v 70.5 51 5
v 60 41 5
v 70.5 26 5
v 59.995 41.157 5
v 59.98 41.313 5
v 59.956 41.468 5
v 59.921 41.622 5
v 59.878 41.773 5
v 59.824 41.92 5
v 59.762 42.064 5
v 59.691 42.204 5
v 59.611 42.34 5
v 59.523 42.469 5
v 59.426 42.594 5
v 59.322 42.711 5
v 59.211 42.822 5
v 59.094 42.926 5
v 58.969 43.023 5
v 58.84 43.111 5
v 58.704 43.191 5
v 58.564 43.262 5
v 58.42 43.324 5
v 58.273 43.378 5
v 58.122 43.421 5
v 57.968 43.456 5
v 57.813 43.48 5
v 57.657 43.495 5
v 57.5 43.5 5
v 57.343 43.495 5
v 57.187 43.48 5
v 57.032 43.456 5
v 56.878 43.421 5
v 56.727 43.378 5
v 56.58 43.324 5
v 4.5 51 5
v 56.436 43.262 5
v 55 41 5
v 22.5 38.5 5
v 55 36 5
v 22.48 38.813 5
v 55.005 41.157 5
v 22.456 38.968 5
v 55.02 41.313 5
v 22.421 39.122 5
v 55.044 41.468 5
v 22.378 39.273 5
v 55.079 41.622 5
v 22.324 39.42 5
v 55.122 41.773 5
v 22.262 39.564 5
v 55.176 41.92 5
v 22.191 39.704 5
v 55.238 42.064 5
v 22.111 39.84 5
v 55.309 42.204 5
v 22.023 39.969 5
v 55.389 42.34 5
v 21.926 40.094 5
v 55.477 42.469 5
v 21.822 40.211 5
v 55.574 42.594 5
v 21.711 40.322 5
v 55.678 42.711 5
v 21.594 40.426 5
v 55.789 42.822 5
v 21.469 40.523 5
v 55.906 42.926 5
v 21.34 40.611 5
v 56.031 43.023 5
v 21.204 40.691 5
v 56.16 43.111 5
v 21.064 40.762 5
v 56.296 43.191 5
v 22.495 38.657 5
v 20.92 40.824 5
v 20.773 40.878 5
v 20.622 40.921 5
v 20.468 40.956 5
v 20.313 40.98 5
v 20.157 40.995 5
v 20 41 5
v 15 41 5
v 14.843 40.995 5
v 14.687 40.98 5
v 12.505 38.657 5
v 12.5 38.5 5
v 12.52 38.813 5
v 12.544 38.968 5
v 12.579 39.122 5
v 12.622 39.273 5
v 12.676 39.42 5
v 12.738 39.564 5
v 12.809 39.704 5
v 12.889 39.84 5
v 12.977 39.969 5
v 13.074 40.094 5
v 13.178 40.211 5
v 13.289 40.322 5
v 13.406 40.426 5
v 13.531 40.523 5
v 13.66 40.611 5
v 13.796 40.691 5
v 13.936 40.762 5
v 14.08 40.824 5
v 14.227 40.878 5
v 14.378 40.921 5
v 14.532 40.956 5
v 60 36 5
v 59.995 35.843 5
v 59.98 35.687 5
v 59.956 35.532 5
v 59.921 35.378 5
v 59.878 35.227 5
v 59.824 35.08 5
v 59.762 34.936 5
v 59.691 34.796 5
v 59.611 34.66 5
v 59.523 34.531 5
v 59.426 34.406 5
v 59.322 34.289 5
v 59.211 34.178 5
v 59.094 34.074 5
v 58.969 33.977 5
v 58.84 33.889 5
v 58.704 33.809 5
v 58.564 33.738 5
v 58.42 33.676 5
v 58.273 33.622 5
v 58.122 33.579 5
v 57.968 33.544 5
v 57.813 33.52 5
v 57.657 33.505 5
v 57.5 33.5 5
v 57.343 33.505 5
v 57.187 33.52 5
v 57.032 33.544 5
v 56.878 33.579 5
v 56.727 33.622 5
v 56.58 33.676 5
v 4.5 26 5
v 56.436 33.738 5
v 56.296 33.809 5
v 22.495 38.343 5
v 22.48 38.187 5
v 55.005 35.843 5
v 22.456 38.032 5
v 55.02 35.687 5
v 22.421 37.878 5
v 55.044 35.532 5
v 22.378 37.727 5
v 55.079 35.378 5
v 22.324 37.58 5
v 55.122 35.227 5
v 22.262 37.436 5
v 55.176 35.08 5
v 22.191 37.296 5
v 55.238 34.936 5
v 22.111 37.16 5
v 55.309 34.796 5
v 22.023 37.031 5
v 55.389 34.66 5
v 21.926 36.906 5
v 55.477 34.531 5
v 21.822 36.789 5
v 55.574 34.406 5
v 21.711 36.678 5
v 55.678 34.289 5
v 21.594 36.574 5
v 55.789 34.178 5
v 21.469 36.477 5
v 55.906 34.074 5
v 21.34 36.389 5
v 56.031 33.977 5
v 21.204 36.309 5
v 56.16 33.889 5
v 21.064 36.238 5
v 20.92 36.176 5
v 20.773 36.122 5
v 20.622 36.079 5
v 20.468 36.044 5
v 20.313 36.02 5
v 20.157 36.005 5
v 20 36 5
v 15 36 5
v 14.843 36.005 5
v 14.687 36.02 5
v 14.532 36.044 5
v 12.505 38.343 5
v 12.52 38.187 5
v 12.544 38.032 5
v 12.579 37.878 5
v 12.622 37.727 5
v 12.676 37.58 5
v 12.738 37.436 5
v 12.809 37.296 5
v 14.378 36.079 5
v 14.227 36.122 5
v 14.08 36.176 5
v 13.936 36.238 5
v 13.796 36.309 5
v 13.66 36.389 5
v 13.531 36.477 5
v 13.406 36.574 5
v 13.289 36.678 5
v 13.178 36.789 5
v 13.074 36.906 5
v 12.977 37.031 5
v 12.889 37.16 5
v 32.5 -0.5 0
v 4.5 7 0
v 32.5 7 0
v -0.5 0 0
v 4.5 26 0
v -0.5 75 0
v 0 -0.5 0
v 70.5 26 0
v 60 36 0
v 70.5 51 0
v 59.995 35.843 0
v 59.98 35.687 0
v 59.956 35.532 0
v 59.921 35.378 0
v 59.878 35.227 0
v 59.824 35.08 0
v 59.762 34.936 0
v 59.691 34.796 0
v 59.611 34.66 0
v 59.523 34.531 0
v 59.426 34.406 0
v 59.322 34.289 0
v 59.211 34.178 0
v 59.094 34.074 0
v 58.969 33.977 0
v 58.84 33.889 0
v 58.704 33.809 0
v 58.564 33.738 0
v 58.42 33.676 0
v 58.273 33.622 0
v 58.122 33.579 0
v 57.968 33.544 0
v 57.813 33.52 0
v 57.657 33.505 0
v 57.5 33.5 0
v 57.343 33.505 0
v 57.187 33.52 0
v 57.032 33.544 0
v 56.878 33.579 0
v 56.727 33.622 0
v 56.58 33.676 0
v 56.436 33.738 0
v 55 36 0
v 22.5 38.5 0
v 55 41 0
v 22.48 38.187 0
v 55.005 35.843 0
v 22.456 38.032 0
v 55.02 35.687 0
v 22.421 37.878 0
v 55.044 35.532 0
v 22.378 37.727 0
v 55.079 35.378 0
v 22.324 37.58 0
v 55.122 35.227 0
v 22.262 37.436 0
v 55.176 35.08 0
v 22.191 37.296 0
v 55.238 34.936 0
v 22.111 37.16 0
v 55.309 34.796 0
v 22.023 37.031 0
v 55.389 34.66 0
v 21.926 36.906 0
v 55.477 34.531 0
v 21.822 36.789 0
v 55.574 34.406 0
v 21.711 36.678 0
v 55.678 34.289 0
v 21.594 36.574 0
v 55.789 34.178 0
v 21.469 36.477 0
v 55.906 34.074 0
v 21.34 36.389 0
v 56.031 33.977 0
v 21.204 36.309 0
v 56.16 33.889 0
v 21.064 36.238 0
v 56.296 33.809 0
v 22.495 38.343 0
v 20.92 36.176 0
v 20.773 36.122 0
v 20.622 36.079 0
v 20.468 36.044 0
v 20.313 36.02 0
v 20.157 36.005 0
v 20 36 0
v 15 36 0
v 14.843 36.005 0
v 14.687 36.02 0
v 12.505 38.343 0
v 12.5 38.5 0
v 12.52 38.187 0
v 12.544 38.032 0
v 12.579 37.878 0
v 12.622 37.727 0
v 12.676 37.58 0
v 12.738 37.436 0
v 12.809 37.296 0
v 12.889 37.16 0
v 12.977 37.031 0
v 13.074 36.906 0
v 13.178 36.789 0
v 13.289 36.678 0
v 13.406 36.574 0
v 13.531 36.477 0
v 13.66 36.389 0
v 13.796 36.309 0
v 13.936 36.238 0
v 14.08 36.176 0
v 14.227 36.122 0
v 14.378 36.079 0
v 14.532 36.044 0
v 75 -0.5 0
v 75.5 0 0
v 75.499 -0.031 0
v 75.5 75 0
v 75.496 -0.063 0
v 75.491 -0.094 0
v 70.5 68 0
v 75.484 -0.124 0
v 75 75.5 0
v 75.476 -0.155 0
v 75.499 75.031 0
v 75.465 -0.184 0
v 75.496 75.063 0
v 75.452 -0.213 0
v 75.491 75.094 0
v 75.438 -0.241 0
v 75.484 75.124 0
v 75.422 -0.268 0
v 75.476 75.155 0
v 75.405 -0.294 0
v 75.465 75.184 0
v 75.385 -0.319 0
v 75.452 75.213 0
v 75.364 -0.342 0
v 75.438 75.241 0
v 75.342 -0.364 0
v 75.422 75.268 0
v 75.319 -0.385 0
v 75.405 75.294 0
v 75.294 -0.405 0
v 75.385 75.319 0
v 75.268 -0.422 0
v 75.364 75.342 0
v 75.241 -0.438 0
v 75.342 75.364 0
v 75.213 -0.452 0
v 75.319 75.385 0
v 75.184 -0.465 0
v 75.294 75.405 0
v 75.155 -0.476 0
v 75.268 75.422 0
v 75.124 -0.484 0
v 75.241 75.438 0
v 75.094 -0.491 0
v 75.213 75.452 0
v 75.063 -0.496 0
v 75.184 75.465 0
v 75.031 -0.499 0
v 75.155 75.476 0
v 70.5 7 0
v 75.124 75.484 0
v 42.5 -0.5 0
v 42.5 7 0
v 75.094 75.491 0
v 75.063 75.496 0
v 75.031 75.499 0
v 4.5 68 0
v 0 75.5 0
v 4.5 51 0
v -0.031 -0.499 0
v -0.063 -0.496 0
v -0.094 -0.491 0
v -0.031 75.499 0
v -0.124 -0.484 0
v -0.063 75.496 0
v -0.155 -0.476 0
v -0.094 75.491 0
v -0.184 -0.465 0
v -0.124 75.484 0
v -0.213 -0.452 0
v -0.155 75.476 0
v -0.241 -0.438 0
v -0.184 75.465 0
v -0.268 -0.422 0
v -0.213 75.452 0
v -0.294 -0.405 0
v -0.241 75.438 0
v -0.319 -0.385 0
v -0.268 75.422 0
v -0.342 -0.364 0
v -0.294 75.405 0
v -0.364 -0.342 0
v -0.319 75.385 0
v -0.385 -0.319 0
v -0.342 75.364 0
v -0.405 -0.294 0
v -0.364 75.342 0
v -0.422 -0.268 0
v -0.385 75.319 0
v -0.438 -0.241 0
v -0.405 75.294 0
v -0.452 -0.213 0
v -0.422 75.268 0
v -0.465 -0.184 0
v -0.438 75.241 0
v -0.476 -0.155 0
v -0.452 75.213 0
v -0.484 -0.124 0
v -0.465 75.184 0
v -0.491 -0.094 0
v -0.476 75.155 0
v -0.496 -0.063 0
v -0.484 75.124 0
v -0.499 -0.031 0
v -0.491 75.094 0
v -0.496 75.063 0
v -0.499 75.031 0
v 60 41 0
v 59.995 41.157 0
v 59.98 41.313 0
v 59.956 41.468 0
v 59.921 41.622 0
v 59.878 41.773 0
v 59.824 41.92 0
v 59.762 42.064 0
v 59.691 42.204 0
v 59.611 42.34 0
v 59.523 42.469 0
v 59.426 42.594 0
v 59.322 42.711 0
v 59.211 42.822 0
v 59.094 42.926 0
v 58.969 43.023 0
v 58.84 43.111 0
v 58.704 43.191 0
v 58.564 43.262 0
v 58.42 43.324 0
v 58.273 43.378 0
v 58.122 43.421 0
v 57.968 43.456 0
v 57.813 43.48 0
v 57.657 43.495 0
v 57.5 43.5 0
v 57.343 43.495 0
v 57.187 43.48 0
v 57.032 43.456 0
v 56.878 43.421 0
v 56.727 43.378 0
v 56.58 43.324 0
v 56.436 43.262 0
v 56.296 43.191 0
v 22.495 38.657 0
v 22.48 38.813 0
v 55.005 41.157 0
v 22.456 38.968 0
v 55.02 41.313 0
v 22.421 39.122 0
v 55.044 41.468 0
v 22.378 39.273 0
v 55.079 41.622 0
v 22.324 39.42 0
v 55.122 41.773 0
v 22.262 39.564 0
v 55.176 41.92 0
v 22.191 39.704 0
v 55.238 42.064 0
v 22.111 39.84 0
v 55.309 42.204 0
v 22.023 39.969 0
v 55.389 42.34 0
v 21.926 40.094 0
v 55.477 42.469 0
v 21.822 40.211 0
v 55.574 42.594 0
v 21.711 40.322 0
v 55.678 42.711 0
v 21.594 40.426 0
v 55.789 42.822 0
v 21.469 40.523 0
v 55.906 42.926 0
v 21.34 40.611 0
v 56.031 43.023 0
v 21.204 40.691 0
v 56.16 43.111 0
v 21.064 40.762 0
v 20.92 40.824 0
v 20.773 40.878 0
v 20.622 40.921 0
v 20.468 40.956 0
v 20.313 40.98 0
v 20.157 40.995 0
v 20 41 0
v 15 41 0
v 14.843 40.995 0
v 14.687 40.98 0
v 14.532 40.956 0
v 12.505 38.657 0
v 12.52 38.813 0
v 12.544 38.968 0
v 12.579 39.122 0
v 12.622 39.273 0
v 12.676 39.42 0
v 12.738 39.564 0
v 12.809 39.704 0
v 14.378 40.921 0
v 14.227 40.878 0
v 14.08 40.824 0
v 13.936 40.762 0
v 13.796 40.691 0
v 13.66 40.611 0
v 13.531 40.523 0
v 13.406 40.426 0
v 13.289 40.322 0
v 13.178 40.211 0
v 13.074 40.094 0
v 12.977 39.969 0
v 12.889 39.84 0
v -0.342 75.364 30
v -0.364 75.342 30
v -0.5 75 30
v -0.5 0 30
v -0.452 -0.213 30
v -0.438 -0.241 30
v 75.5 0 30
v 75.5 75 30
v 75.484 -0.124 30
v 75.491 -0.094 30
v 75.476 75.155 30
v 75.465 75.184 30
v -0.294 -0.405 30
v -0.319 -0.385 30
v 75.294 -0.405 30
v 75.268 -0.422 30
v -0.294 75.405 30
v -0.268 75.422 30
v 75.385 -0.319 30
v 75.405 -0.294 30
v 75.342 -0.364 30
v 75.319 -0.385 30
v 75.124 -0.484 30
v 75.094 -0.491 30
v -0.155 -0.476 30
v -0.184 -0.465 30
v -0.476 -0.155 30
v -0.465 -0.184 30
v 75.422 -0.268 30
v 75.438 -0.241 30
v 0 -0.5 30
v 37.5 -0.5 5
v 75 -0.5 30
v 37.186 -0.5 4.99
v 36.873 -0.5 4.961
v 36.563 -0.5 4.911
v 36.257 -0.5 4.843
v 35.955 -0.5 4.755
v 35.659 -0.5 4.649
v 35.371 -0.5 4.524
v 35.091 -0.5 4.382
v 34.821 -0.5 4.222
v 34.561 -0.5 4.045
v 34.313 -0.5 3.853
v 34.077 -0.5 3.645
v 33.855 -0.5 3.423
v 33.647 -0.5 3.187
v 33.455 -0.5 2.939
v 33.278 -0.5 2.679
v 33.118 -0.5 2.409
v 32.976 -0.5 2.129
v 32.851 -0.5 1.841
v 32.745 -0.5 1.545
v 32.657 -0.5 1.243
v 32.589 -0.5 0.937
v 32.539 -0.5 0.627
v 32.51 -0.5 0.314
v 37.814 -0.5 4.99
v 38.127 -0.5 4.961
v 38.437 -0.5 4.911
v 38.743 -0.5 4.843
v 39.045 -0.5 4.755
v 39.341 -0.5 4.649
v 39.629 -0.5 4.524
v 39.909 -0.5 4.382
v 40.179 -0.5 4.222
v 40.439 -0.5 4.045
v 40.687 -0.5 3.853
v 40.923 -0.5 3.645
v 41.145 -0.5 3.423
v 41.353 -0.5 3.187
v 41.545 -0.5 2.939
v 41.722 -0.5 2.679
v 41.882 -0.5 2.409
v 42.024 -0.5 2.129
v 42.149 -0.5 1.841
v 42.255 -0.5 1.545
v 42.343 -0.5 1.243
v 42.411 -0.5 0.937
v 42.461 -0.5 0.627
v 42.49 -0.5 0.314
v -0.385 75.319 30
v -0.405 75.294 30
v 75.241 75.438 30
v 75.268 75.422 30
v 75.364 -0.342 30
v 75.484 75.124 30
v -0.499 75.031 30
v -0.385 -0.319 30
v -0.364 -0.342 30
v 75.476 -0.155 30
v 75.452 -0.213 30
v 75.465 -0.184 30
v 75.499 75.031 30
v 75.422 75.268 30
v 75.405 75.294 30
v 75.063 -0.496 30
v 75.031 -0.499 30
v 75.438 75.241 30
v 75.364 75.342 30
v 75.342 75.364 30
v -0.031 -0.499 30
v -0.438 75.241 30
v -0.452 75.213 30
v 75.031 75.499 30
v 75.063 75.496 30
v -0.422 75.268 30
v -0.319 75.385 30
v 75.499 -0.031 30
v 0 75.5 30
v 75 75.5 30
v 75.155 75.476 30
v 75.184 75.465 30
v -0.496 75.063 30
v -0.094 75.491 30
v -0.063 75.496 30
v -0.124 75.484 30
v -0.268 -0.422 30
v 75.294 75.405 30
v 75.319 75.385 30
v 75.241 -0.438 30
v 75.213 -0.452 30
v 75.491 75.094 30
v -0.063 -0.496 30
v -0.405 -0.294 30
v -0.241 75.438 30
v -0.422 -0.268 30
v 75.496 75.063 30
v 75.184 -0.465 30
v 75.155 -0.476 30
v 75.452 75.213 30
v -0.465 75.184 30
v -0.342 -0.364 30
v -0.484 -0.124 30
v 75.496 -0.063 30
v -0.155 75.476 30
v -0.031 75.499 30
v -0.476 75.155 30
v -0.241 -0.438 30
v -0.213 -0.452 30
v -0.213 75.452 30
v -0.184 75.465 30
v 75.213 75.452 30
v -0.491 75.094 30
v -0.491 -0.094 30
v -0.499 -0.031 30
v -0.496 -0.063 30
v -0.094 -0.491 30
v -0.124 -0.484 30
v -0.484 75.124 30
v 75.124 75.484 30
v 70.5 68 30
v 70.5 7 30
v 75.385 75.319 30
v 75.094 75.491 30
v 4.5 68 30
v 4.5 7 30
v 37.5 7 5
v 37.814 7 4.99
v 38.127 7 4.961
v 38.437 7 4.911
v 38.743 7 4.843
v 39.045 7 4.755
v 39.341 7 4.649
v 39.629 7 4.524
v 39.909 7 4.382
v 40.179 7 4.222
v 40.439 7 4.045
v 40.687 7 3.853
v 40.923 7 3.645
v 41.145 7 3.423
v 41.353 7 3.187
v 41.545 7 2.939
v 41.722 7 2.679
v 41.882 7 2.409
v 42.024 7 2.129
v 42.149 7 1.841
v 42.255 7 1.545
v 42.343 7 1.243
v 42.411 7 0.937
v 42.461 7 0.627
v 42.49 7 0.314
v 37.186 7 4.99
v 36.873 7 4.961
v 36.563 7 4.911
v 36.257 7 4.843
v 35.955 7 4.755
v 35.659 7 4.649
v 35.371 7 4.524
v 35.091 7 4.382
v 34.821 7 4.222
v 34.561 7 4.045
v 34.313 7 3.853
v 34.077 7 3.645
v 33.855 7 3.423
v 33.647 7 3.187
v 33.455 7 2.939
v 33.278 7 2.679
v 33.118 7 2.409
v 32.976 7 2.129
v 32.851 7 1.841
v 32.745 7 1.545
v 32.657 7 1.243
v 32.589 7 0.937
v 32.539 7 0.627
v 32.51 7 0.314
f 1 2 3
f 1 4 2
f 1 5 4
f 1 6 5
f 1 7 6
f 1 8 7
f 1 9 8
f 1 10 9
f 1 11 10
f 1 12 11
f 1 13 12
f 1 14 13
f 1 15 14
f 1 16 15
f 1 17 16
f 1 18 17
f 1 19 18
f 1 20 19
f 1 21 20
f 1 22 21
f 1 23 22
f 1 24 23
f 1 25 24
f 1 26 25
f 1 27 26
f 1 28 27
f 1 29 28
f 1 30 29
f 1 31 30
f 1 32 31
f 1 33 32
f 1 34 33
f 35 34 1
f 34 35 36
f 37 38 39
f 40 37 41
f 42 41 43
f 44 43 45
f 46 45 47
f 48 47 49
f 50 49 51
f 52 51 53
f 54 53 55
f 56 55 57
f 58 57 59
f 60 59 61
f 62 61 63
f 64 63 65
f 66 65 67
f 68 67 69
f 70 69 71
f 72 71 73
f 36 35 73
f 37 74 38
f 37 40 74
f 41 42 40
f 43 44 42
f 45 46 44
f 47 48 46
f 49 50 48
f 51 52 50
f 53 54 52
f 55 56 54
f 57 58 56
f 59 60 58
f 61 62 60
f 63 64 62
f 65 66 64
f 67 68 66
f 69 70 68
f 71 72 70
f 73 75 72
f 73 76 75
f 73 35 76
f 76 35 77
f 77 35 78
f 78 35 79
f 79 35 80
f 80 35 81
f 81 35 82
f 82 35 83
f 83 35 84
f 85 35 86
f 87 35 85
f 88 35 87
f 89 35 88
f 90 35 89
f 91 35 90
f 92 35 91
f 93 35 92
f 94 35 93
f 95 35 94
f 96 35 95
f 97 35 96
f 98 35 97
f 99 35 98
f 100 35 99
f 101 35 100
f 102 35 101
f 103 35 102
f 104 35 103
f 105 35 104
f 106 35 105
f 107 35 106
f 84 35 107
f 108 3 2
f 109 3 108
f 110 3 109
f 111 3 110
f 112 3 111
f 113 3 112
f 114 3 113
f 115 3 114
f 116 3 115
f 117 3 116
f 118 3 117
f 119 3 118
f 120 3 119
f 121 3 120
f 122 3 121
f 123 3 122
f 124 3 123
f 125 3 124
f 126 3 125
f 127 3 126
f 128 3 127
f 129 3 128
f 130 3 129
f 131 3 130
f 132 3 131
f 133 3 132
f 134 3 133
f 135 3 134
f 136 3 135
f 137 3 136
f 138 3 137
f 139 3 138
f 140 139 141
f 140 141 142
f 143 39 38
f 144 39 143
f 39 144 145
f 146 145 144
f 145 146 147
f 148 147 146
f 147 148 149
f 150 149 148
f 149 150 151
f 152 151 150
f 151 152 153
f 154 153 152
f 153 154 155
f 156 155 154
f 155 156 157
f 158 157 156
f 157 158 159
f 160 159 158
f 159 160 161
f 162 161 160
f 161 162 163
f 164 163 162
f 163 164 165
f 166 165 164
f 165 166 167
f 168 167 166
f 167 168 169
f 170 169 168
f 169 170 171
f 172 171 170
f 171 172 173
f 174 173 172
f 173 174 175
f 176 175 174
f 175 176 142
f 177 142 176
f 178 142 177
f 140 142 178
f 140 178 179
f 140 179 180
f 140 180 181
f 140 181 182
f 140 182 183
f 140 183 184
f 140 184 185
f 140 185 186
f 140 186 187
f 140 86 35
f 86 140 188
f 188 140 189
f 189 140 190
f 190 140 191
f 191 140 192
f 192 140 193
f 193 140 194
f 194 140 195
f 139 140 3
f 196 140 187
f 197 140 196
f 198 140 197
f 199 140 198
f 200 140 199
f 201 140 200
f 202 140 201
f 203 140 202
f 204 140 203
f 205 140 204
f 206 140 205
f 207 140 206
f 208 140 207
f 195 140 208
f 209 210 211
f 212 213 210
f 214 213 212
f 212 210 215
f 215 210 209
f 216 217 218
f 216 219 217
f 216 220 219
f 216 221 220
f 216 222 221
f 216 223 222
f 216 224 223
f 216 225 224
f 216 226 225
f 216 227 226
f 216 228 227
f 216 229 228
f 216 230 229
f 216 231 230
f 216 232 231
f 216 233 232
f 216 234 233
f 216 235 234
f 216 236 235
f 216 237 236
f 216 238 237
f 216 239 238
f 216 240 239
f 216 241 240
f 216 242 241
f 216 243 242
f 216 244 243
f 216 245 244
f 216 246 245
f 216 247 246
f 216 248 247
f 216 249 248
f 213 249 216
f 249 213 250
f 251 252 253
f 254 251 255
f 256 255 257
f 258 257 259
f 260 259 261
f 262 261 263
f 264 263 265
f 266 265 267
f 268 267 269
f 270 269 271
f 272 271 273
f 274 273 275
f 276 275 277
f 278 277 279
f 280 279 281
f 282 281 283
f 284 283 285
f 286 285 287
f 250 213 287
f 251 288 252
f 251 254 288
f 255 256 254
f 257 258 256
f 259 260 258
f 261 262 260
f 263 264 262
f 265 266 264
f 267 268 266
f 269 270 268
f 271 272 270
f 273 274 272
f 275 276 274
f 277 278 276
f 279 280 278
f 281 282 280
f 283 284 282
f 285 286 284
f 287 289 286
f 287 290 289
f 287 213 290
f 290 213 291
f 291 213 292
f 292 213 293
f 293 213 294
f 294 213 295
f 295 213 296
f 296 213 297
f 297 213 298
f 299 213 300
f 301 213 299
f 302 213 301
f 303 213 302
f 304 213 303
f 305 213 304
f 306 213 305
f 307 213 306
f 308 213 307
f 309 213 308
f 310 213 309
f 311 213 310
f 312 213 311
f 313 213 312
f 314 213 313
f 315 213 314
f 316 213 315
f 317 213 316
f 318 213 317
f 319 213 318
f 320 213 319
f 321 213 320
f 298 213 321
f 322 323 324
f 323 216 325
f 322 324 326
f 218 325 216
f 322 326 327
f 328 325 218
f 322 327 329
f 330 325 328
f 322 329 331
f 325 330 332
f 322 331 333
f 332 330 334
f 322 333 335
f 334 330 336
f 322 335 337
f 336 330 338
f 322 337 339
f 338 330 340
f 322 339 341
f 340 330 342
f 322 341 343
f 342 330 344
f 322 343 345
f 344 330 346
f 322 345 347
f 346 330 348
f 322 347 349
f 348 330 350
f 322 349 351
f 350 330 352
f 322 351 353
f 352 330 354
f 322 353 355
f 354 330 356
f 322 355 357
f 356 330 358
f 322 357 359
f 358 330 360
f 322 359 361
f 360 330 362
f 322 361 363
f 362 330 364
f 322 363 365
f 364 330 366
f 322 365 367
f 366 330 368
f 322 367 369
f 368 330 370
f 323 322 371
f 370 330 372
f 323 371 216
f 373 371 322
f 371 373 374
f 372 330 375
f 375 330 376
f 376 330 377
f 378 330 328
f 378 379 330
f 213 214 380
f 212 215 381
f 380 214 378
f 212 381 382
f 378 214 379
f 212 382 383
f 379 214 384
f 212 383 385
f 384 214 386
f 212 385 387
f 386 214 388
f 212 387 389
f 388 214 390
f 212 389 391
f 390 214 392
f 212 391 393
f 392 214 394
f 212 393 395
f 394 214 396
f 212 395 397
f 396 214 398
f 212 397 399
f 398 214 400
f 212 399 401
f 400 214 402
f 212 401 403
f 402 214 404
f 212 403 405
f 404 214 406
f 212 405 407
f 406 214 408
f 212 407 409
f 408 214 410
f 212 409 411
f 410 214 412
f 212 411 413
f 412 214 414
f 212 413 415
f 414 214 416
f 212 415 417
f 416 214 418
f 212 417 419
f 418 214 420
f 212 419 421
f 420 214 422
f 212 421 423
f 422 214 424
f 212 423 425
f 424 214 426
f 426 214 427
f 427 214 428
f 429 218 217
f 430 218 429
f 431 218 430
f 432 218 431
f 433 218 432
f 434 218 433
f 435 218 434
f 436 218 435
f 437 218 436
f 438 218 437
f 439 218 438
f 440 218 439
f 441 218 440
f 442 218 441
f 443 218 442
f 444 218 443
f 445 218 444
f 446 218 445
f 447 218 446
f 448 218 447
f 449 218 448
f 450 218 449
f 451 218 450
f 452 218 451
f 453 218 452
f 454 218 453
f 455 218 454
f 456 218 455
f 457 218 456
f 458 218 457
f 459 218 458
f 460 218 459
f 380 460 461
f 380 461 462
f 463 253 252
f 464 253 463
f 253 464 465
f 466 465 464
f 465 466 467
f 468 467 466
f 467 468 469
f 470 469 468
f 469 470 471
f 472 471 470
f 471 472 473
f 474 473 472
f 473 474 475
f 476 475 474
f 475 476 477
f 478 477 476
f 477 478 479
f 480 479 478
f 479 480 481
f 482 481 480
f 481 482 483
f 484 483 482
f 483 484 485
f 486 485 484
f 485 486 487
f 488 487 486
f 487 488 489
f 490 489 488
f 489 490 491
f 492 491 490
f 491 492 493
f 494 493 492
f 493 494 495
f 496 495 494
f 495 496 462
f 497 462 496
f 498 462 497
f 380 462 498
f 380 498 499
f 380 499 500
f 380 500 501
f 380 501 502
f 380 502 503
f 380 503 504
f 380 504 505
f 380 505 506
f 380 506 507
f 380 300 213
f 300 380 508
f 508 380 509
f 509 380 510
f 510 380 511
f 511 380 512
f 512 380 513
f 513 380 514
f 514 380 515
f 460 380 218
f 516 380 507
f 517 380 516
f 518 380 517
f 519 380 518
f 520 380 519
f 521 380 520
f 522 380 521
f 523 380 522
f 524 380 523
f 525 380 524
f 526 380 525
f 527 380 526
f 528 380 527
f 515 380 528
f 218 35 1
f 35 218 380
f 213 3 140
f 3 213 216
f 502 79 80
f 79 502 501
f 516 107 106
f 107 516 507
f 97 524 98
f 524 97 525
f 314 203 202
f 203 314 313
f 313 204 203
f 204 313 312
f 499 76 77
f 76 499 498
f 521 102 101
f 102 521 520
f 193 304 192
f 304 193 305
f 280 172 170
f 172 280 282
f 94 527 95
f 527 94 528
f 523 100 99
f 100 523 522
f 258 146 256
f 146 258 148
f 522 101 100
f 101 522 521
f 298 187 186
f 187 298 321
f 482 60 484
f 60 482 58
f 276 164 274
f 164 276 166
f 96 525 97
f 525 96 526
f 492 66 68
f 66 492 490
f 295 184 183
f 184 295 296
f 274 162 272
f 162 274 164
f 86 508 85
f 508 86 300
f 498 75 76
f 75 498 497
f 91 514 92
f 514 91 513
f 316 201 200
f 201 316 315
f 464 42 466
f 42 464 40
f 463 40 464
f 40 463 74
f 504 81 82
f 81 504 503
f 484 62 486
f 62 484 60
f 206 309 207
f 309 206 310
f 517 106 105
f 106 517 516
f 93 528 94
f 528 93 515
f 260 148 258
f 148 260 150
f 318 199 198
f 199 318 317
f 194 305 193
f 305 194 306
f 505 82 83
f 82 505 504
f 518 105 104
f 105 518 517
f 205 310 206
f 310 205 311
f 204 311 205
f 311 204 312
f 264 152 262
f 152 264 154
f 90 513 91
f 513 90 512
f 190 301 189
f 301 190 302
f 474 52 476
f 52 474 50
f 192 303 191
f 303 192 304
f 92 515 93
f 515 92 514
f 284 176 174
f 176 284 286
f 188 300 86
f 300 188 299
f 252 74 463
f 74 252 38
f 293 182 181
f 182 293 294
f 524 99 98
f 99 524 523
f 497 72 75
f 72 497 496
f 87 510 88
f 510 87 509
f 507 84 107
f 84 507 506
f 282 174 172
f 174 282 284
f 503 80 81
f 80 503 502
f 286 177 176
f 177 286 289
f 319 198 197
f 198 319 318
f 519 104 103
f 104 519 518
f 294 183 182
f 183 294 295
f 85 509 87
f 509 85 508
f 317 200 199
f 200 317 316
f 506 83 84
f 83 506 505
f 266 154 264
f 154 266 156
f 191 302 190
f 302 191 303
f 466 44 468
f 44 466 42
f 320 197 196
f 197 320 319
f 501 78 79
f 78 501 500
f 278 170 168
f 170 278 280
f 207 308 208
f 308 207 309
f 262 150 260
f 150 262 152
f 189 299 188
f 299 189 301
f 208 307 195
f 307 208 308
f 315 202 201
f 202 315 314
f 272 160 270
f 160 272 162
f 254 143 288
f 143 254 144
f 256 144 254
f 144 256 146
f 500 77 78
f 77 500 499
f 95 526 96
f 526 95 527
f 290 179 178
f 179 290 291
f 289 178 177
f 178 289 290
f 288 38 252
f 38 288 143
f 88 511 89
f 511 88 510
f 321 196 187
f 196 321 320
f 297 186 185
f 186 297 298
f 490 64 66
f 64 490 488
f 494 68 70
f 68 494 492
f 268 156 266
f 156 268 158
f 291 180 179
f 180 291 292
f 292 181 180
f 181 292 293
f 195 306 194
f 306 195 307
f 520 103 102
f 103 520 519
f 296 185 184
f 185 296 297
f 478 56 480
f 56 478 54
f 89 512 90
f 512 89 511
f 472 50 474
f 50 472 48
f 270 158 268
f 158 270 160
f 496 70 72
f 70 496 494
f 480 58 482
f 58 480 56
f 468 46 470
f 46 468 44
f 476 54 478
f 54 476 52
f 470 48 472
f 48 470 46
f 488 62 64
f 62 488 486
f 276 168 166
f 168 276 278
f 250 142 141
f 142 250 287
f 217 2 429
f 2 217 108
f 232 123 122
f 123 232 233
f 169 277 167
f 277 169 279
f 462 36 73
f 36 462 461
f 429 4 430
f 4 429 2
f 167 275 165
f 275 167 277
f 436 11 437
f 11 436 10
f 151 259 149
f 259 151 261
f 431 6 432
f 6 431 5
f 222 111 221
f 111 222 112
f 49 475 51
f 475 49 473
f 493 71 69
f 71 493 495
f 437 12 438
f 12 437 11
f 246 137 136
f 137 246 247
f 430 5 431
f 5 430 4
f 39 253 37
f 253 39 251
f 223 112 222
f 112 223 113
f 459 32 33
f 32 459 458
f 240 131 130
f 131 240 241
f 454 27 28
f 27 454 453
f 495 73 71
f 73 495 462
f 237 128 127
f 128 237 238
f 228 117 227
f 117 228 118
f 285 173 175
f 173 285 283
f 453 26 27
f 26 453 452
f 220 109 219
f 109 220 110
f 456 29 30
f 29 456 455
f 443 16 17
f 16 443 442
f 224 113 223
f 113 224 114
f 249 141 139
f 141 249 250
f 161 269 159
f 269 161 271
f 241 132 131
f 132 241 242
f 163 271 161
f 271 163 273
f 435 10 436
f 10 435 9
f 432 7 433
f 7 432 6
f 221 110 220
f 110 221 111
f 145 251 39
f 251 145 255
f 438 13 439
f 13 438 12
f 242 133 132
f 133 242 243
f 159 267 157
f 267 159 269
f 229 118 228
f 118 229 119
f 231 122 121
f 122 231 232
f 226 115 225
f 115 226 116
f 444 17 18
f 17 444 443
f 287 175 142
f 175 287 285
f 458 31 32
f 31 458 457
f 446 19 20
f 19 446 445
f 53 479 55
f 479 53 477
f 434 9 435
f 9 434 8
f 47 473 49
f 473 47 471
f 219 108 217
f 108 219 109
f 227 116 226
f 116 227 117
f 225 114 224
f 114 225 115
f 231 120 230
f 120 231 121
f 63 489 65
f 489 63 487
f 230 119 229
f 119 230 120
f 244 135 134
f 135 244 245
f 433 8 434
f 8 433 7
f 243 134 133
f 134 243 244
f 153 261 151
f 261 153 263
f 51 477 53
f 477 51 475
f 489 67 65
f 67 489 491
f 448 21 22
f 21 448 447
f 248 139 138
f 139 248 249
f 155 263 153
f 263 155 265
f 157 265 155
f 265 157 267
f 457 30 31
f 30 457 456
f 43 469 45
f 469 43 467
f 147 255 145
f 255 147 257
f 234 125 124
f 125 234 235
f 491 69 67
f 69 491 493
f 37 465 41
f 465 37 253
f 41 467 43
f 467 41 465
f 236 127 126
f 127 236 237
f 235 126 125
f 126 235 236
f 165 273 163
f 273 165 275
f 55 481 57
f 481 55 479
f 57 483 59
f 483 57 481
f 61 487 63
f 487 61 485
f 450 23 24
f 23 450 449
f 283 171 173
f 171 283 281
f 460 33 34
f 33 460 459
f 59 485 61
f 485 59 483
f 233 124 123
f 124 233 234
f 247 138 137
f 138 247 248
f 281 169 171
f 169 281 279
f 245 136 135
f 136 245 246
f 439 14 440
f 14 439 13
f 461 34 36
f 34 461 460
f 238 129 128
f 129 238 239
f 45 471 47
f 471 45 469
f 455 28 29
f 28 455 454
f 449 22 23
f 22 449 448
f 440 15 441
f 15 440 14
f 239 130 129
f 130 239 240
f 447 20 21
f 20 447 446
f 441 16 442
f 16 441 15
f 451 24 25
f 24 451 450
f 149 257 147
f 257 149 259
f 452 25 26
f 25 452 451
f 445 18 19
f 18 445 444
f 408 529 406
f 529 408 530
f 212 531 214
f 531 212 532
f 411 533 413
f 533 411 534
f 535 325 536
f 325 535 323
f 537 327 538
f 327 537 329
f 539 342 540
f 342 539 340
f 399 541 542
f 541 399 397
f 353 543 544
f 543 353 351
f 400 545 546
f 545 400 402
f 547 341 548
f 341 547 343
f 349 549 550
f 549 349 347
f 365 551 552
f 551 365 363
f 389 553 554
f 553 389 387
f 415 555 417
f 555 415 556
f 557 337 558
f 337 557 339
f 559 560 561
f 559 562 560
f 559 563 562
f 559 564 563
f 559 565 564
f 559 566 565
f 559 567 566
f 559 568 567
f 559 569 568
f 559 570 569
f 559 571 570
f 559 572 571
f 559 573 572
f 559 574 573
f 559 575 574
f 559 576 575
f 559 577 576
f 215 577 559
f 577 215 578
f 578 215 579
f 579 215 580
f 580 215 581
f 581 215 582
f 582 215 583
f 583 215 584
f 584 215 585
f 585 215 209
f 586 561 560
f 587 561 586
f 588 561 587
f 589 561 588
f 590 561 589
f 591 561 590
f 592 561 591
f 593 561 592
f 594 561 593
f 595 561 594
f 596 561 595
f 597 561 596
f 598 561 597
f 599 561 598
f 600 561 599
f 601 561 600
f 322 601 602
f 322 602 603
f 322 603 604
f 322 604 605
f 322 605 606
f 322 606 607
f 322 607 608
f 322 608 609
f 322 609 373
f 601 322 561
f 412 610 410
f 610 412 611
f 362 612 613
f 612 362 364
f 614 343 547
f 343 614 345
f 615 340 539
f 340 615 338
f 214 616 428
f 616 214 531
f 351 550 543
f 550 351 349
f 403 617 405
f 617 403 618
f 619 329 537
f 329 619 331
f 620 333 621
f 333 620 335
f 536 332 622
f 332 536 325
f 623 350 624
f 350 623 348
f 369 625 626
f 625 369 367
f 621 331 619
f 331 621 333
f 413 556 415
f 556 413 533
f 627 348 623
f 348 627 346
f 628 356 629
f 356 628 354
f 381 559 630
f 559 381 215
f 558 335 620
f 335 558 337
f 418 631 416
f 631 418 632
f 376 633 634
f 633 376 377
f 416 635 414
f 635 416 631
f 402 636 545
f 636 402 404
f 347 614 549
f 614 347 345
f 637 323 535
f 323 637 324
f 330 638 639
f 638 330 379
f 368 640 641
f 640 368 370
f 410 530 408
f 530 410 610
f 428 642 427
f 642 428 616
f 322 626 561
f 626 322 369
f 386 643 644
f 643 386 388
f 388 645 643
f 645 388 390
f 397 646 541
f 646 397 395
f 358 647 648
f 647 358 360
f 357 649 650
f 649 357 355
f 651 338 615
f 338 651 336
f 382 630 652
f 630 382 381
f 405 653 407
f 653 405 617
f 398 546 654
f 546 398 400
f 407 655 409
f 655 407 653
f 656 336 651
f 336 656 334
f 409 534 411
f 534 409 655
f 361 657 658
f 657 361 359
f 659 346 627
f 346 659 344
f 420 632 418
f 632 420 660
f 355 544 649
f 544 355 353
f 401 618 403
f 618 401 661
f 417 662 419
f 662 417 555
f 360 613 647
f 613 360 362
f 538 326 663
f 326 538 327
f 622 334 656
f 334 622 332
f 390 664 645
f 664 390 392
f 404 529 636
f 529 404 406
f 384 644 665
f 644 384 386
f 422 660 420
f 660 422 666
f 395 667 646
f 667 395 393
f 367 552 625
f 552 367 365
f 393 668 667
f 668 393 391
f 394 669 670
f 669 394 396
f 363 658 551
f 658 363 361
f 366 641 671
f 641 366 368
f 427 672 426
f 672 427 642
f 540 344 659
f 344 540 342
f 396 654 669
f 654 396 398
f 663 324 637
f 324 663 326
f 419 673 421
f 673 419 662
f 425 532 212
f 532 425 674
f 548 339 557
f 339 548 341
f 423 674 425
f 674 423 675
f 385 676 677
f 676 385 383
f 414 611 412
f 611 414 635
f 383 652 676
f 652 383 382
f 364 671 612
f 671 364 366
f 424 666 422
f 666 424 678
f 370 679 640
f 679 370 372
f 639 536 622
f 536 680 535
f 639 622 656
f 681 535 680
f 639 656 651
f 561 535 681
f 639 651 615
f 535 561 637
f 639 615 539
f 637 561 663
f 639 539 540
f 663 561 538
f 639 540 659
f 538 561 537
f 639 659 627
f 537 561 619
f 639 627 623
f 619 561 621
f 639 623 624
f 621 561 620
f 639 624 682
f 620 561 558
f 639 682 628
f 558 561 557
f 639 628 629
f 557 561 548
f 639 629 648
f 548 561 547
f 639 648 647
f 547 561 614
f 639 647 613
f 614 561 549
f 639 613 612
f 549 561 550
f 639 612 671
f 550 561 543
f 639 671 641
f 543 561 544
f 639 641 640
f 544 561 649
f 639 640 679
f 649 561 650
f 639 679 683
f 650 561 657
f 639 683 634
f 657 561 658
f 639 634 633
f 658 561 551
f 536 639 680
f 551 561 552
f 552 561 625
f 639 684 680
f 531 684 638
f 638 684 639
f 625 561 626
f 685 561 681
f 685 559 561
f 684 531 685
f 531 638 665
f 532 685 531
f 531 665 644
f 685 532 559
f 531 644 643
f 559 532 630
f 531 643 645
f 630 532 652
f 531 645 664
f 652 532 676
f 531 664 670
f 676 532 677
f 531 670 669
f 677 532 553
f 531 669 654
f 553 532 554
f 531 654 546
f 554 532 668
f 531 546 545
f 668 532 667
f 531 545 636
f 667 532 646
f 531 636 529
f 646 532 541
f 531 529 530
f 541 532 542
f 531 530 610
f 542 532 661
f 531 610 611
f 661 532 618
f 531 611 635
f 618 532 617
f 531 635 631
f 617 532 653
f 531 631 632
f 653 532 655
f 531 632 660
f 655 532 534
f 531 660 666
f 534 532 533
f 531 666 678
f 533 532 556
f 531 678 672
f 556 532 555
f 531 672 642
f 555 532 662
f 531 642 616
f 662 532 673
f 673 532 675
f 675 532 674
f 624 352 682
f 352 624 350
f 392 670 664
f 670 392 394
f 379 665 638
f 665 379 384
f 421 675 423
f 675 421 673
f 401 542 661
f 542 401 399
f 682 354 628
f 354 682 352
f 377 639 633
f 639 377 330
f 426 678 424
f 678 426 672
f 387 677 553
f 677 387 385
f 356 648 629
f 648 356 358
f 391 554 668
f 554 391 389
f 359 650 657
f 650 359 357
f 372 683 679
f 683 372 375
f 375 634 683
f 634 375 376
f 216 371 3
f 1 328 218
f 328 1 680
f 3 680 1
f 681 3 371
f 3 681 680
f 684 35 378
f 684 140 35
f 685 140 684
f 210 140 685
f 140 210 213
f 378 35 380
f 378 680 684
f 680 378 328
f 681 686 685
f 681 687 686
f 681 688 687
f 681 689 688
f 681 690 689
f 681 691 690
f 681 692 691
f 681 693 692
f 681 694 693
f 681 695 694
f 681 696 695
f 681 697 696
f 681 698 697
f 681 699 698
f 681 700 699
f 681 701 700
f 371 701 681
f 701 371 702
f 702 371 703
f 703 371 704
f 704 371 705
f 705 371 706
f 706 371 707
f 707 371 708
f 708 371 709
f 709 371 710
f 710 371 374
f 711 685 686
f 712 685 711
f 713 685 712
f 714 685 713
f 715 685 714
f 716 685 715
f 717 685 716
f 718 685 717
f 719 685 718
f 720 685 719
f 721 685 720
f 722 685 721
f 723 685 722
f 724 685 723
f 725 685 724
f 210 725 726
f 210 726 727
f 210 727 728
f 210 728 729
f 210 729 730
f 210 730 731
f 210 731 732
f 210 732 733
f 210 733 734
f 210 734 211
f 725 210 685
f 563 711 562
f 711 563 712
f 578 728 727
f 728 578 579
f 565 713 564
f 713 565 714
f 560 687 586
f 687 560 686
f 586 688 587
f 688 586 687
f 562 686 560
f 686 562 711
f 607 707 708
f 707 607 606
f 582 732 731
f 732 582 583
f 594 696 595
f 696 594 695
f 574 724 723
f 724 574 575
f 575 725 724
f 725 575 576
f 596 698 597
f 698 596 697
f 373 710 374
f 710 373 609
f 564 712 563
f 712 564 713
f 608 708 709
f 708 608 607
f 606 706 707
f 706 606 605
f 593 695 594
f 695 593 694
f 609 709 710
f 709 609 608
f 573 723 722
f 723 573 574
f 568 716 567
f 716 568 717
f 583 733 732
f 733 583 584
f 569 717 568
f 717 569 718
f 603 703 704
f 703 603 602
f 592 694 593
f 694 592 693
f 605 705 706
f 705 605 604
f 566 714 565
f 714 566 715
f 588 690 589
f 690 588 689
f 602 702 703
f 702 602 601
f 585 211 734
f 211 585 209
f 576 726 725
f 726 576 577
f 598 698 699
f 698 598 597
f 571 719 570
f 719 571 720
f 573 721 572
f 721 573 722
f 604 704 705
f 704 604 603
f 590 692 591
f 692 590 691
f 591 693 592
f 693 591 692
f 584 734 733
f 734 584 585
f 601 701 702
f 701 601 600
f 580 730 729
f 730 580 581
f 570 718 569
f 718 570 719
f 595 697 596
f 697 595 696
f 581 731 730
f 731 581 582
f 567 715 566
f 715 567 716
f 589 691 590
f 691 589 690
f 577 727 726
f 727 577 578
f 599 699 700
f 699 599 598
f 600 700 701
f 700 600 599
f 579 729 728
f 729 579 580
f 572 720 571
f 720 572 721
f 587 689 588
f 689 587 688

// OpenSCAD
$fn = 100;
eps = 0.01;
h = 30;
d = 1;
a = 75;

module connector(){
    difference(){
        cube([60,25,5]);
        translate([5+2.5,10+2.5,-eps]) hull(){
            cylinder(h=5+2*eps,d=5);
            translate([5,0,0]) cylinder(h=5+2*eps,d=5);
        }
        translate([60-10,10,-eps]) hull(){
            cylinder(h=5+2*eps,d=5);
            translate([0,5,0]) cylinder(h=5+2*eps,d=5);
        }
      
    }
}
translate([(75-60)/2,26,0]) connector();
translate([0,26,0]) cube([10,25,5]);
translate([65,26,0]) cube([10,25,5]);


difference()
{
    union(){
        //%translate([-d/2,-d/2,0])cube([75,75,30]);
        hull(){
            cylinder(h=h,d=d);
            translate([a,0,0]) cylinder(h=h,d=d);
            translate([a,a,0]) cylinder(h=h,d=d);
            translate([0,a,0]) cylinder(h=h,d=d);
        }
    }
    translate([(75-66)/2,(75-61)/2,-1]) cube([66,61,30+2]);
    translate([75/2,8,0]) rotate([90,0,0]) cylinder(d=10,h=10);
}
